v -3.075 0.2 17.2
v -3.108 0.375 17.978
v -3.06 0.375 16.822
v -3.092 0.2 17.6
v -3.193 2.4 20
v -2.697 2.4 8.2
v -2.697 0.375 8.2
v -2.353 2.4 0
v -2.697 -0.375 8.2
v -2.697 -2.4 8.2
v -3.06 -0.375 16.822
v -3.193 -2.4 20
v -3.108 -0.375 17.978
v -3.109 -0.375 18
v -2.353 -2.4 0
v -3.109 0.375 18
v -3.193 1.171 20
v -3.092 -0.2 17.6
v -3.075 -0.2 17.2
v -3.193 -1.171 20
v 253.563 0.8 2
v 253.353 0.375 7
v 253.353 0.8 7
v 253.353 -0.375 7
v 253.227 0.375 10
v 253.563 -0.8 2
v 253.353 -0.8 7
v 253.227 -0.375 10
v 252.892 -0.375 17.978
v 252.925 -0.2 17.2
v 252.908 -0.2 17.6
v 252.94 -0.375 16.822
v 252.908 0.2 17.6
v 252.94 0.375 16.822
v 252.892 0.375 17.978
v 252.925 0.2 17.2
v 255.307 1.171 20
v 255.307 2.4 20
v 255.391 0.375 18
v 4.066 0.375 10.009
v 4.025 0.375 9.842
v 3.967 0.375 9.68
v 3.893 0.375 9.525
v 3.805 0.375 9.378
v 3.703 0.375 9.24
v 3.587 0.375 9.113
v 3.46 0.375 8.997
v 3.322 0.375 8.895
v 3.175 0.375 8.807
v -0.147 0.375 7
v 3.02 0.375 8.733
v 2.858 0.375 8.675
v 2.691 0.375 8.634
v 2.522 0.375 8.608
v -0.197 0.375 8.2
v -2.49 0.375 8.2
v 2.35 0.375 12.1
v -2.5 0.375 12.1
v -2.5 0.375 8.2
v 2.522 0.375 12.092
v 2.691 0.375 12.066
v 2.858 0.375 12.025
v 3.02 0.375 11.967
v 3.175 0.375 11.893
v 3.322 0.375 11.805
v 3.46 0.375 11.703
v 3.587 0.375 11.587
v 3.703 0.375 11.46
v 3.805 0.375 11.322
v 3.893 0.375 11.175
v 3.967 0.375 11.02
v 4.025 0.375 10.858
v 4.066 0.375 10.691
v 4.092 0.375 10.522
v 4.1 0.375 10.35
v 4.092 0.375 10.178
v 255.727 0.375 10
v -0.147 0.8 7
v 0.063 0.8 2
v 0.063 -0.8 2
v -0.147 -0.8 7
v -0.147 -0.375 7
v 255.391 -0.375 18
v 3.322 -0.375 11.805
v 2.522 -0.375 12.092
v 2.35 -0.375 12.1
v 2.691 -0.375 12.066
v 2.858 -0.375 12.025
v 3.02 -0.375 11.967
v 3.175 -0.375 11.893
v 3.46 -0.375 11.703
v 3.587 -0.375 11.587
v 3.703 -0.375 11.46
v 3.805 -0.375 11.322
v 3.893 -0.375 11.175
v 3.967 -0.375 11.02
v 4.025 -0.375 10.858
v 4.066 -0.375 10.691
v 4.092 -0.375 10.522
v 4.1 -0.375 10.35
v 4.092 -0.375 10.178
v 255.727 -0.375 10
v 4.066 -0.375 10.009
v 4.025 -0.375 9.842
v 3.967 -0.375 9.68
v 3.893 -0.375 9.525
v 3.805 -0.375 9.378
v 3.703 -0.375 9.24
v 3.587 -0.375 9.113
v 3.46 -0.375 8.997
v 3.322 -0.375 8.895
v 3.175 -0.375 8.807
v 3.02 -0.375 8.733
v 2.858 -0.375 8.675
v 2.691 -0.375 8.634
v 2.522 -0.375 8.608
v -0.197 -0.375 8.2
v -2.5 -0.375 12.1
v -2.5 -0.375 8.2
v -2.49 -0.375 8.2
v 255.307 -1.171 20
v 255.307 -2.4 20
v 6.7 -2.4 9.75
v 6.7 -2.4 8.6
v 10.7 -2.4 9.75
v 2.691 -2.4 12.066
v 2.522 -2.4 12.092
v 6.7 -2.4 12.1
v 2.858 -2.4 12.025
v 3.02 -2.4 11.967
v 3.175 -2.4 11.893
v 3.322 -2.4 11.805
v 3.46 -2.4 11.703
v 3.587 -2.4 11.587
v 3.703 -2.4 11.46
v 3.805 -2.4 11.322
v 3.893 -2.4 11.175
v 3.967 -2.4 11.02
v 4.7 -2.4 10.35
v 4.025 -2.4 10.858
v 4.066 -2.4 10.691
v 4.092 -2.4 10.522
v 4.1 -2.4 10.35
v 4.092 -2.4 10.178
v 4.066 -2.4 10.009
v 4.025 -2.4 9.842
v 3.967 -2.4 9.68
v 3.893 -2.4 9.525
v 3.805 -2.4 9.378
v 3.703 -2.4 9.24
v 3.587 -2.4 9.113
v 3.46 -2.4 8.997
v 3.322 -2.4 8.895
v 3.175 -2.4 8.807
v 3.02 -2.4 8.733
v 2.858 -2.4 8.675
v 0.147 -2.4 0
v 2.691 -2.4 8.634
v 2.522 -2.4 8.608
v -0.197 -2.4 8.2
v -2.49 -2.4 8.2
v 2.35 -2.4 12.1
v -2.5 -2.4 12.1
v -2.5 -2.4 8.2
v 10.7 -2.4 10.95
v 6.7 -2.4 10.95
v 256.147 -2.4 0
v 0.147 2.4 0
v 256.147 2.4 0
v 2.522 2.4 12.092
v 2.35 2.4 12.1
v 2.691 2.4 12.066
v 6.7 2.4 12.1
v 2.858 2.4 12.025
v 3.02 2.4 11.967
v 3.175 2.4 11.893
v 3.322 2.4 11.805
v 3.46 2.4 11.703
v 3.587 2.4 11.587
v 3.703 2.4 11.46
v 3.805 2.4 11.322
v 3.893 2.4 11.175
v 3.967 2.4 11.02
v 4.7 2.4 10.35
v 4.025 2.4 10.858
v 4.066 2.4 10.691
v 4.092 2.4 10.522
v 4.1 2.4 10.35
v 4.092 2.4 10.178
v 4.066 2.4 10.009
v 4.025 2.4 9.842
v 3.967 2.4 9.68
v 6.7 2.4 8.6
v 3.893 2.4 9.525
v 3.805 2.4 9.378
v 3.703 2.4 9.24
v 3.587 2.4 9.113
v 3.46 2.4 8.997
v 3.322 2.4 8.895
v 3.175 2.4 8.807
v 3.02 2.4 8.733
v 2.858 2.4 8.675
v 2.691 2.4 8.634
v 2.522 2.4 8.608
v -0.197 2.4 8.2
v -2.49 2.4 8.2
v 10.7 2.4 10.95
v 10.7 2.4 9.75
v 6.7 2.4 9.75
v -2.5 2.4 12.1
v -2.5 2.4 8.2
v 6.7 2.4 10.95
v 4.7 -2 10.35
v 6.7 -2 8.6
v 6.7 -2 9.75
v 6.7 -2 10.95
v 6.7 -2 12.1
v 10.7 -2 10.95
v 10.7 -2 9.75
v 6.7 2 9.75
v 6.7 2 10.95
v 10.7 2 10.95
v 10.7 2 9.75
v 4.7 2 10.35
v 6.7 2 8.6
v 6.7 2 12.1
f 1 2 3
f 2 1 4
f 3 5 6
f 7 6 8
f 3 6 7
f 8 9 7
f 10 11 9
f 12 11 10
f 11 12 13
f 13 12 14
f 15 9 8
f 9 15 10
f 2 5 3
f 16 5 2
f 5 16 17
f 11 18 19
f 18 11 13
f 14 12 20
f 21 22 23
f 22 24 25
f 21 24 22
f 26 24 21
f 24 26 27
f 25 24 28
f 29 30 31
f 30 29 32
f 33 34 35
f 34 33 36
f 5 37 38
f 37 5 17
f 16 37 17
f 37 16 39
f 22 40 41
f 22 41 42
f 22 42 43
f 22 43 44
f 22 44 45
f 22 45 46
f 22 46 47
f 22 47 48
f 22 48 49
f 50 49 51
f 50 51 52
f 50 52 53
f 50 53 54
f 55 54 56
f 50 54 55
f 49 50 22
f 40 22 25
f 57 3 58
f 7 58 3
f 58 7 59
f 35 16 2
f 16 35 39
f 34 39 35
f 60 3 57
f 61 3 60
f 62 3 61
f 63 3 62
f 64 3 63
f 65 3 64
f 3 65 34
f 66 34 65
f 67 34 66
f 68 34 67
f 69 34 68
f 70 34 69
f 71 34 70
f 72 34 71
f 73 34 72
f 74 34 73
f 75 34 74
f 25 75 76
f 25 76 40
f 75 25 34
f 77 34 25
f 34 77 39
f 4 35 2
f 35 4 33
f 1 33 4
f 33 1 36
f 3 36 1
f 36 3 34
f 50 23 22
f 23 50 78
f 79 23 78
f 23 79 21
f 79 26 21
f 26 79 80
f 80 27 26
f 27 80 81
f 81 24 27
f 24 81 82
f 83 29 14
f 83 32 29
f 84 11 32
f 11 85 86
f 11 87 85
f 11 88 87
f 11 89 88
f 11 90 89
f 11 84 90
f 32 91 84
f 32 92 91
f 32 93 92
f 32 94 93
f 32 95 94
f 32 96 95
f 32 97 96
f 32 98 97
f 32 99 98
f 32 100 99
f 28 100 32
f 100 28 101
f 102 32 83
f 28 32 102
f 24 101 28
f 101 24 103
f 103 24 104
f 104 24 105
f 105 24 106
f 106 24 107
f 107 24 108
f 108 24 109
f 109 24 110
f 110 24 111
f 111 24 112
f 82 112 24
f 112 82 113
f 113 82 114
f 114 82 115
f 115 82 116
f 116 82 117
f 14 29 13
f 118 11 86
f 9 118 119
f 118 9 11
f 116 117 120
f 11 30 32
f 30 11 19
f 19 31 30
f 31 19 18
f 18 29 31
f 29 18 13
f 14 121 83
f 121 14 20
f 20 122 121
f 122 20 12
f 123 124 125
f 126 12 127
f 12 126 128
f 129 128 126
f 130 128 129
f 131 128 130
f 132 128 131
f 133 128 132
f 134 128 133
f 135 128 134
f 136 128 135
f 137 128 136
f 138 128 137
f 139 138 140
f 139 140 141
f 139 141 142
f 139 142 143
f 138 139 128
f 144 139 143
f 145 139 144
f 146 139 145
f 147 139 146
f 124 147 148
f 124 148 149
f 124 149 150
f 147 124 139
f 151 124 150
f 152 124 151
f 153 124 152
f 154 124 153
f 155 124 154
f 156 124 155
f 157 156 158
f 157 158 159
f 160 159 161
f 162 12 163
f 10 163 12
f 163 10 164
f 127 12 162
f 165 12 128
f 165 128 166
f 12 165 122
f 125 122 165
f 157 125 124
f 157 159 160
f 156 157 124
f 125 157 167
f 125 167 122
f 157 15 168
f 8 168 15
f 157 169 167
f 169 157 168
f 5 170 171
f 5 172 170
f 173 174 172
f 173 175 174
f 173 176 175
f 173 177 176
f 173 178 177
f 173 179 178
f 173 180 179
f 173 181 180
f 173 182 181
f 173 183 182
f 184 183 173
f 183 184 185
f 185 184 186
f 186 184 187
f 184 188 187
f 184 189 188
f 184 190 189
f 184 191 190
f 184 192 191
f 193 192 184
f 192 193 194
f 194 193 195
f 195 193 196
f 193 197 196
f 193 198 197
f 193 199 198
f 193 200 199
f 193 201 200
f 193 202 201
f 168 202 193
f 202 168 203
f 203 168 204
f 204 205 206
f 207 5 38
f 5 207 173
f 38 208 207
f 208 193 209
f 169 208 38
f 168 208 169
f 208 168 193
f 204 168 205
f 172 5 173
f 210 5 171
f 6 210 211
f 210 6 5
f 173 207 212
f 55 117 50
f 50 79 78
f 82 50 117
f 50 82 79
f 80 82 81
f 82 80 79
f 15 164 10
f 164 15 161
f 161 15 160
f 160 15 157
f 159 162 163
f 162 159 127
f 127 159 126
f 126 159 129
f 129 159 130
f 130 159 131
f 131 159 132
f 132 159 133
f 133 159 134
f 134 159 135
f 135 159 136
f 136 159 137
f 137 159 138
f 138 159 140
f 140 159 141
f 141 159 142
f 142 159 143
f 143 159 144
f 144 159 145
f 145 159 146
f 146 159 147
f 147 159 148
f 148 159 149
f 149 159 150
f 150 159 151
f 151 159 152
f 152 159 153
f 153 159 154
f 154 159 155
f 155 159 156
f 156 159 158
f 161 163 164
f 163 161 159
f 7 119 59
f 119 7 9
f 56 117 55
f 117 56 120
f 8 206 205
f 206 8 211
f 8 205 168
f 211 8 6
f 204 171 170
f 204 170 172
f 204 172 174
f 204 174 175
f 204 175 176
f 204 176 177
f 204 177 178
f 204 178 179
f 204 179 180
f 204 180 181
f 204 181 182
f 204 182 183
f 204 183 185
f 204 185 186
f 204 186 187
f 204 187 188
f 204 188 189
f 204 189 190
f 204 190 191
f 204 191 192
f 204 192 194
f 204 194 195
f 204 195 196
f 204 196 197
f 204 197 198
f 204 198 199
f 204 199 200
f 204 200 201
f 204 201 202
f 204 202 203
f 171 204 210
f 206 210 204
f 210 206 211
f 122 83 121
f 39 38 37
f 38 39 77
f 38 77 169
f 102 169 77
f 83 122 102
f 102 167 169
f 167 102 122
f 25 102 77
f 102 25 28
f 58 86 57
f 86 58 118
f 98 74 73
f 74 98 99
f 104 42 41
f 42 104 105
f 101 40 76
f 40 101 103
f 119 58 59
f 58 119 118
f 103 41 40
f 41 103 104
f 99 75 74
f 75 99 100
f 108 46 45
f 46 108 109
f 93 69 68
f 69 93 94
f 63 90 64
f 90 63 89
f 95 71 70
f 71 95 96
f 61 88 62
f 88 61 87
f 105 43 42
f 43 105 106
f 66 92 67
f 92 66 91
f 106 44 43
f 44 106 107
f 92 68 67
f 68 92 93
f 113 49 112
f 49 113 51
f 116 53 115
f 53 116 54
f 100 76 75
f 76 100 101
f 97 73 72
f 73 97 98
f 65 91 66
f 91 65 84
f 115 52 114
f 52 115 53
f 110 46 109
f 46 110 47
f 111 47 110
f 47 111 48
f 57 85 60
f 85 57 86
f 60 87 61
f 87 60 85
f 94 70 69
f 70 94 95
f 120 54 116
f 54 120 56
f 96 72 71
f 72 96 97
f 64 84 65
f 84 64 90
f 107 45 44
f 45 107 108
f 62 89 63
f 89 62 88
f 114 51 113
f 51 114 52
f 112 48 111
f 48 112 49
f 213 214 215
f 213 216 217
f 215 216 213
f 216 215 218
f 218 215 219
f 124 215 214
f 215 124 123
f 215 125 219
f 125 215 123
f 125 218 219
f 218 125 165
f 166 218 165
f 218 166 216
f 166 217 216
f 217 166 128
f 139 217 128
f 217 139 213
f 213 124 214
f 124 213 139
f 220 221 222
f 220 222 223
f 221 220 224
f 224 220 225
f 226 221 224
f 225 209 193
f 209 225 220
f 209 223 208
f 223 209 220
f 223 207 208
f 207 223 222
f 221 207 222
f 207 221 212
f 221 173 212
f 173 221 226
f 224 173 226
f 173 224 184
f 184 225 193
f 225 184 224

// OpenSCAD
// Ryoba saw tooth covers: one cover per toothed edge, same design as the dozuki cover.
// Each is a U-channel that presses onto its toothed edge from the side, capped at both ends.
// Inside: a wider channel at the bottom for the set teeth, a thin slot above it for the
// blade body, and >< pinch nubs that grip the blade.
// The end caps lean to match the blade's end edges (/__/).
// Print on its closed bottom edge, opening up - no supports or bridges.

part = "rip";          // which cover: "rip" or "crosscut" - export each one separately

blade_t     = 0.6;     // blade body thickness (shared by both edges)

// ---- edge shape, the same on both edges (the blade is symmetrical) ----
edge_len    = 250;     // full bottom length, including the end diagonals
end_rise    = 1.5;     // MEASURE: rise of the diagonals at each end (assumed same as the dozuki)
heel_run    = 6;       // diagonal length at the heel (handle) end, part of edge_len
toe_run     = 8;       // diagonal length at the toe (tip) end, part of edge_len
w_heel      = 61;      // blade width at the handle end, edge to edge
w_tip       = 82;      // blade width at the tip, edge to edge
// each edge splays out from the centreline by this angle; the blade's ends are square
// to the centreline, so seen from each edge they lean back toward the heel by the same angle
taper       = atan(((w_tip - w_heel) / 2) / edge_len);
heel_lean   = -taper;  // lean of the heel end edge, degrees from vertical (+ = toward the toe)
toe_lean    = -taper;  // lean of the toe end edge

// ---- teeth, can differ per edge ----
rip_kerf    = 1.0;     // MEASURE: thickness across the set rip teeth
rip_tooth_h = 4;       // MEASURE: rip tooth height
cc_kerf     = 0.9;     // MEASURE: thickness across the set crosscut teeth
cc_tooth_h  = 2.5;     // MEASURE: crosscut tooth height

kerf    = part == "rip" ? rip_kerf    : cc_kerf;
tooth_h = part == "rip" ? rip_tooth_h : cc_tooth_h;

end_clear   = 0.5;     // gap between each blade end and its end cap
cover_h     = 18;      // how far up the blade it reaches
body_gap    = 0.15;    // slot clearance on the blade body (small = more friction)
teeth_gap   = 0.6;     // clearance on the teeth
floor_t     = 2;       // wall under the tooth tips
wall        = 1.6;     // side wall thickness
end_wall    = 2.5;     // end caps at the heel and toe
end_caps    = true;    // false to see the profile from the end - set true before printing
// heel end: the blade rises straight up from the cutting edge, then has a rounded notch
// cut in toward the tip, then curves away into the neck. The heel end wall only fills
// the straight rise; a rounded lobe on top of it fills the notch; above that the side
// walls carry on to the end with no end wall, around the neck.
notch_bottom = 6.2;    // straight rise from the cutting edge to the bottom of the notch
notch_depth  = 4;      // MEASURE: how far the notch cuts in toward the tip, from the rise
notch_h      = 4.3;    // notch height (lobe comes out 0.8 smaller: 3.5)
notch_clear  = 0.4;    // gap around the lobe inside the notch
mark_depth   = 0.4;    // the lobe's outline is engraved this deep on both outside faces
tip_slit     = 0.5;    // blade slit through the top part of the tip end wall, as a fraction
                       // of its height, so the blade can start sliding in from that end
cutaway     = false;   // view only: one side wall removed - set false before printing

// blade mockup (view only - set show_blade false before exporting)
show_blade  = false;

lead_in     = 0.8;     // chamfer on the slot lips so it pushes on easier
pinch_gap   = blade_t - 0.2;   // gap between the pinch nubs: 0.2 under the blade
                               // (the dozuki cover used 0.1 under: 0.3 blade, 0.2 gap)
pinch_h     = 1.2;     // height of the pinch nubs
pinch_land  = 0.4;     // flat on the nub tips - a sharp point is thinner than the nozzle
                       // line, so the slicer would drop it and leave a bigger gap

tip_extra  = 2.5;                      // extra room at the tip end (first print was too short)
blade_len  = edge_len + 2*end_clear + tip_extra;   // inside length, at the blade's corners
body_slot  = blade_t + body_gap;
teeth_slot = kerf + teeth_gap;
width      = teeth_slot + 2*wall;
height     = floor_t + cover_h;

// cross-section: x across the blade, y up from the bottom edge
module profile() {
    difference() {
        translate([-width/2, 0]) square([width, height]);
        translate([-teeth_slot/2, floor_t]) square([teeth_slot, tooth_h + 1]);
        translate([-body_slot/2, floor_t]) square([body_slot, cover_h + 1]);
        polygon([[-body_slot/2, height - 2], [-body_slot/2 - lead_in, height + 0.01],
                 [ body_slot/2 + lead_in, height + 0.01], [ body_slot/2, height - 2]]);
        // view only: drop the +x side wall to look inside
        if (cutaway) translate([body_slot/2 + 0.01, -1]) square([width, height + 2]);
    }
    // >< pinch nubs just under the chamfer, pointing in from both walls
    y0 = height - 2;
    for (s = [-1, 1])
        polygon([[s * (body_slot/2 + 0.01), y0],
                 [s * pinch_gap/2, y0 - (pinch_h - pinch_land)/2],
                 [s * pinch_gap/2, y0 - (pinch_h + pinch_land)/2],
                 [s * (body_slot/2 + 0.01), y0 - pinch_h]]);
}

// whole blade, side view: x along this cover's edge from its heel corner, y up from it.
// The bottom half is this edge with its end diagonals and leaning ends; the top half is
// its mirror across the blade's centreline, which splays up at the taper angle.
module blade_outline() {
    big = 200;
    up_heel = [sin(heel_lean), cos(heel_lean)];
    up_toe  = [sin(toe_lean),  cos(toe_lean)];
    p0 = [0, end_rise] + (w_heel/2 - end_rise) * up_heel;   // centreline at the heel end
    module half() {
        intersection() {
            polygon([[heel_run, 0], [edge_len - toe_run, 0], [edge_len, end_rise],
                     [edge_len, end_rise] + big * up_toe,
                     [0, end_rise] + big * up_heel, [0, end_rise]]);
            translate(p0) rotate(taper) translate([-big, -big]) square([4*big, big]);
        }
    }
    half();
    translate(p0) rotate(taper) mirror([0, 1]) rotate(-taper) translate(-p0) half();
}

// blade standing in the slot, tooth edge on the floor, end_clear from the heel end wall
if (show_blade)
    color("silver", 0.6)
        translate([end_clear, 0, floor_t])
            rotate([90, 0, 0]) linear_extrude(height = blade_t, center = true) blade_outline();

// --- cover, built in its own frame: x across, y up, z along the length ---

// lean a shape along the length by angle a, pivoting at the height of the blade's
// corners so the caps sit end_clear from them
module lean(a) {
    k = tan(a);
    y_ref = floor_t + end_rise;
    multmatrix([[1, 0, 0, 0], [0, 1, 0, 0], [0, k, 1, -k * y_ref]]) children();
}

// slab between a face at z0 leaning a0 and a face at z1 leaning a1,
// oversized across and up so it only trims the length
module span(z0, a0, z1, a1) {
    big = 1000;
    intersection() {
        lean(a0) translate([-width, -1, z0])       cube([2*width, big, big]);
        lean(a1) translate([-width, -1, z1 - big]) cube([2*width, big, big]);
    }
}

// channel profile run well past both ends, trimmed to length by span()
module run(z0, a0, z1, a1) {
    intersection() {
        translate([0, 0, -end_wall - 10]) linear_extrude(height = blade_len + 2*end_wall + 20)
            children();
        span(z0, a0, z1, a1);
    }
}

// rounded lobe that fills the heel notch: flat on the end wall side, round toward the tip
module notch_lobe() {
    y1 = floor_t + notch_bottom + notch_clear;
    lh = notch_h - 2*notch_clear;
    z_tip = end_clear + notch_depth - notch_clear;   // blade's rise sits at z = end_clear
    hull() {
        // flat side sits on the end wall's top, so the lobe grows straight out of it
        translate([-width/2, floor_t + notch_bottom, -end_wall])
            cube([width, lh + notch_clear, 0.01]);
        translate([0, y1 + lh/2, max(z_tip - lh/2, -end_wall)]) rotate([0, 90, 0])
            cylinder(d = lh, h = width, center = true, $fn = 64);
    }
}

// arrow engraved on both outside faces, level with the lobe and pointing along the cover
// toward it (toward the heel), to show where it is
module lobe_marks() {
    z_tip = end_clear + notch_depth - notch_clear + 0.6;                  // just past the lobe's tip
    yc    = floor_t + notch_bottom + notch_h / 2;                         // lobe's mid height
    for (s = [-1, 1])
        // map the 2D arrow's x to the cover's length (z) and its y to up (y), cut in across x
        multmatrix([[0, 0, 1, s > 0 ? width/2 - mark_depth : -width/2 - 1],
                    [0, 1, 0, 0], [1, 0, 0, 0]])
            linear_extrude(height = mark_depth + 1)
                translate([z_tip, yc]) rotate(-90)
                    polygon([[0, 0], [-1.75, 2], [-0.6, 2], [-0.6, 6],
                             [0.6, 6], [0.6, 2], [1.75, 2]]);
}

// length along x, opening facing up
rotate([90, 0, 90]) difference() {
  union() {
    // side walls and floor run on past the heel to the end wall's outer face
    run(end_caps ? -end_wall : 0, heel_lean, blade_len, toe_lean) profile();
    if (end_caps) {
        // heel: end wall only up to the notch, with the lobe on top filling the notch
        run(-end_wall, heel_lean, 0, heel_lean)
            translate([-width/2, 0]) square([width, floor_t + notch_bottom]);
        notch_lobe();
        // tip: full height end wall, with the blade slot cut down through its top part
        run(blade_len, toe_lean, blade_len + end_wall, toe_lean)
            difference() {
                translate([-width/2, 0]) square([width, height]);
                translate([-body_slot/2, height * (1 - tip_slit)]) square([body_slot, height]);
                polygon([[-body_slot/2, height - 2], [-body_slot/2 - lead_in, height + 0.01],
                         [ body_slot/2 + lead_in, height + 0.01], [ body_slot/2, height - 2]]);
            }
    }
  }
  if (end_caps) lobe_marks();
}
